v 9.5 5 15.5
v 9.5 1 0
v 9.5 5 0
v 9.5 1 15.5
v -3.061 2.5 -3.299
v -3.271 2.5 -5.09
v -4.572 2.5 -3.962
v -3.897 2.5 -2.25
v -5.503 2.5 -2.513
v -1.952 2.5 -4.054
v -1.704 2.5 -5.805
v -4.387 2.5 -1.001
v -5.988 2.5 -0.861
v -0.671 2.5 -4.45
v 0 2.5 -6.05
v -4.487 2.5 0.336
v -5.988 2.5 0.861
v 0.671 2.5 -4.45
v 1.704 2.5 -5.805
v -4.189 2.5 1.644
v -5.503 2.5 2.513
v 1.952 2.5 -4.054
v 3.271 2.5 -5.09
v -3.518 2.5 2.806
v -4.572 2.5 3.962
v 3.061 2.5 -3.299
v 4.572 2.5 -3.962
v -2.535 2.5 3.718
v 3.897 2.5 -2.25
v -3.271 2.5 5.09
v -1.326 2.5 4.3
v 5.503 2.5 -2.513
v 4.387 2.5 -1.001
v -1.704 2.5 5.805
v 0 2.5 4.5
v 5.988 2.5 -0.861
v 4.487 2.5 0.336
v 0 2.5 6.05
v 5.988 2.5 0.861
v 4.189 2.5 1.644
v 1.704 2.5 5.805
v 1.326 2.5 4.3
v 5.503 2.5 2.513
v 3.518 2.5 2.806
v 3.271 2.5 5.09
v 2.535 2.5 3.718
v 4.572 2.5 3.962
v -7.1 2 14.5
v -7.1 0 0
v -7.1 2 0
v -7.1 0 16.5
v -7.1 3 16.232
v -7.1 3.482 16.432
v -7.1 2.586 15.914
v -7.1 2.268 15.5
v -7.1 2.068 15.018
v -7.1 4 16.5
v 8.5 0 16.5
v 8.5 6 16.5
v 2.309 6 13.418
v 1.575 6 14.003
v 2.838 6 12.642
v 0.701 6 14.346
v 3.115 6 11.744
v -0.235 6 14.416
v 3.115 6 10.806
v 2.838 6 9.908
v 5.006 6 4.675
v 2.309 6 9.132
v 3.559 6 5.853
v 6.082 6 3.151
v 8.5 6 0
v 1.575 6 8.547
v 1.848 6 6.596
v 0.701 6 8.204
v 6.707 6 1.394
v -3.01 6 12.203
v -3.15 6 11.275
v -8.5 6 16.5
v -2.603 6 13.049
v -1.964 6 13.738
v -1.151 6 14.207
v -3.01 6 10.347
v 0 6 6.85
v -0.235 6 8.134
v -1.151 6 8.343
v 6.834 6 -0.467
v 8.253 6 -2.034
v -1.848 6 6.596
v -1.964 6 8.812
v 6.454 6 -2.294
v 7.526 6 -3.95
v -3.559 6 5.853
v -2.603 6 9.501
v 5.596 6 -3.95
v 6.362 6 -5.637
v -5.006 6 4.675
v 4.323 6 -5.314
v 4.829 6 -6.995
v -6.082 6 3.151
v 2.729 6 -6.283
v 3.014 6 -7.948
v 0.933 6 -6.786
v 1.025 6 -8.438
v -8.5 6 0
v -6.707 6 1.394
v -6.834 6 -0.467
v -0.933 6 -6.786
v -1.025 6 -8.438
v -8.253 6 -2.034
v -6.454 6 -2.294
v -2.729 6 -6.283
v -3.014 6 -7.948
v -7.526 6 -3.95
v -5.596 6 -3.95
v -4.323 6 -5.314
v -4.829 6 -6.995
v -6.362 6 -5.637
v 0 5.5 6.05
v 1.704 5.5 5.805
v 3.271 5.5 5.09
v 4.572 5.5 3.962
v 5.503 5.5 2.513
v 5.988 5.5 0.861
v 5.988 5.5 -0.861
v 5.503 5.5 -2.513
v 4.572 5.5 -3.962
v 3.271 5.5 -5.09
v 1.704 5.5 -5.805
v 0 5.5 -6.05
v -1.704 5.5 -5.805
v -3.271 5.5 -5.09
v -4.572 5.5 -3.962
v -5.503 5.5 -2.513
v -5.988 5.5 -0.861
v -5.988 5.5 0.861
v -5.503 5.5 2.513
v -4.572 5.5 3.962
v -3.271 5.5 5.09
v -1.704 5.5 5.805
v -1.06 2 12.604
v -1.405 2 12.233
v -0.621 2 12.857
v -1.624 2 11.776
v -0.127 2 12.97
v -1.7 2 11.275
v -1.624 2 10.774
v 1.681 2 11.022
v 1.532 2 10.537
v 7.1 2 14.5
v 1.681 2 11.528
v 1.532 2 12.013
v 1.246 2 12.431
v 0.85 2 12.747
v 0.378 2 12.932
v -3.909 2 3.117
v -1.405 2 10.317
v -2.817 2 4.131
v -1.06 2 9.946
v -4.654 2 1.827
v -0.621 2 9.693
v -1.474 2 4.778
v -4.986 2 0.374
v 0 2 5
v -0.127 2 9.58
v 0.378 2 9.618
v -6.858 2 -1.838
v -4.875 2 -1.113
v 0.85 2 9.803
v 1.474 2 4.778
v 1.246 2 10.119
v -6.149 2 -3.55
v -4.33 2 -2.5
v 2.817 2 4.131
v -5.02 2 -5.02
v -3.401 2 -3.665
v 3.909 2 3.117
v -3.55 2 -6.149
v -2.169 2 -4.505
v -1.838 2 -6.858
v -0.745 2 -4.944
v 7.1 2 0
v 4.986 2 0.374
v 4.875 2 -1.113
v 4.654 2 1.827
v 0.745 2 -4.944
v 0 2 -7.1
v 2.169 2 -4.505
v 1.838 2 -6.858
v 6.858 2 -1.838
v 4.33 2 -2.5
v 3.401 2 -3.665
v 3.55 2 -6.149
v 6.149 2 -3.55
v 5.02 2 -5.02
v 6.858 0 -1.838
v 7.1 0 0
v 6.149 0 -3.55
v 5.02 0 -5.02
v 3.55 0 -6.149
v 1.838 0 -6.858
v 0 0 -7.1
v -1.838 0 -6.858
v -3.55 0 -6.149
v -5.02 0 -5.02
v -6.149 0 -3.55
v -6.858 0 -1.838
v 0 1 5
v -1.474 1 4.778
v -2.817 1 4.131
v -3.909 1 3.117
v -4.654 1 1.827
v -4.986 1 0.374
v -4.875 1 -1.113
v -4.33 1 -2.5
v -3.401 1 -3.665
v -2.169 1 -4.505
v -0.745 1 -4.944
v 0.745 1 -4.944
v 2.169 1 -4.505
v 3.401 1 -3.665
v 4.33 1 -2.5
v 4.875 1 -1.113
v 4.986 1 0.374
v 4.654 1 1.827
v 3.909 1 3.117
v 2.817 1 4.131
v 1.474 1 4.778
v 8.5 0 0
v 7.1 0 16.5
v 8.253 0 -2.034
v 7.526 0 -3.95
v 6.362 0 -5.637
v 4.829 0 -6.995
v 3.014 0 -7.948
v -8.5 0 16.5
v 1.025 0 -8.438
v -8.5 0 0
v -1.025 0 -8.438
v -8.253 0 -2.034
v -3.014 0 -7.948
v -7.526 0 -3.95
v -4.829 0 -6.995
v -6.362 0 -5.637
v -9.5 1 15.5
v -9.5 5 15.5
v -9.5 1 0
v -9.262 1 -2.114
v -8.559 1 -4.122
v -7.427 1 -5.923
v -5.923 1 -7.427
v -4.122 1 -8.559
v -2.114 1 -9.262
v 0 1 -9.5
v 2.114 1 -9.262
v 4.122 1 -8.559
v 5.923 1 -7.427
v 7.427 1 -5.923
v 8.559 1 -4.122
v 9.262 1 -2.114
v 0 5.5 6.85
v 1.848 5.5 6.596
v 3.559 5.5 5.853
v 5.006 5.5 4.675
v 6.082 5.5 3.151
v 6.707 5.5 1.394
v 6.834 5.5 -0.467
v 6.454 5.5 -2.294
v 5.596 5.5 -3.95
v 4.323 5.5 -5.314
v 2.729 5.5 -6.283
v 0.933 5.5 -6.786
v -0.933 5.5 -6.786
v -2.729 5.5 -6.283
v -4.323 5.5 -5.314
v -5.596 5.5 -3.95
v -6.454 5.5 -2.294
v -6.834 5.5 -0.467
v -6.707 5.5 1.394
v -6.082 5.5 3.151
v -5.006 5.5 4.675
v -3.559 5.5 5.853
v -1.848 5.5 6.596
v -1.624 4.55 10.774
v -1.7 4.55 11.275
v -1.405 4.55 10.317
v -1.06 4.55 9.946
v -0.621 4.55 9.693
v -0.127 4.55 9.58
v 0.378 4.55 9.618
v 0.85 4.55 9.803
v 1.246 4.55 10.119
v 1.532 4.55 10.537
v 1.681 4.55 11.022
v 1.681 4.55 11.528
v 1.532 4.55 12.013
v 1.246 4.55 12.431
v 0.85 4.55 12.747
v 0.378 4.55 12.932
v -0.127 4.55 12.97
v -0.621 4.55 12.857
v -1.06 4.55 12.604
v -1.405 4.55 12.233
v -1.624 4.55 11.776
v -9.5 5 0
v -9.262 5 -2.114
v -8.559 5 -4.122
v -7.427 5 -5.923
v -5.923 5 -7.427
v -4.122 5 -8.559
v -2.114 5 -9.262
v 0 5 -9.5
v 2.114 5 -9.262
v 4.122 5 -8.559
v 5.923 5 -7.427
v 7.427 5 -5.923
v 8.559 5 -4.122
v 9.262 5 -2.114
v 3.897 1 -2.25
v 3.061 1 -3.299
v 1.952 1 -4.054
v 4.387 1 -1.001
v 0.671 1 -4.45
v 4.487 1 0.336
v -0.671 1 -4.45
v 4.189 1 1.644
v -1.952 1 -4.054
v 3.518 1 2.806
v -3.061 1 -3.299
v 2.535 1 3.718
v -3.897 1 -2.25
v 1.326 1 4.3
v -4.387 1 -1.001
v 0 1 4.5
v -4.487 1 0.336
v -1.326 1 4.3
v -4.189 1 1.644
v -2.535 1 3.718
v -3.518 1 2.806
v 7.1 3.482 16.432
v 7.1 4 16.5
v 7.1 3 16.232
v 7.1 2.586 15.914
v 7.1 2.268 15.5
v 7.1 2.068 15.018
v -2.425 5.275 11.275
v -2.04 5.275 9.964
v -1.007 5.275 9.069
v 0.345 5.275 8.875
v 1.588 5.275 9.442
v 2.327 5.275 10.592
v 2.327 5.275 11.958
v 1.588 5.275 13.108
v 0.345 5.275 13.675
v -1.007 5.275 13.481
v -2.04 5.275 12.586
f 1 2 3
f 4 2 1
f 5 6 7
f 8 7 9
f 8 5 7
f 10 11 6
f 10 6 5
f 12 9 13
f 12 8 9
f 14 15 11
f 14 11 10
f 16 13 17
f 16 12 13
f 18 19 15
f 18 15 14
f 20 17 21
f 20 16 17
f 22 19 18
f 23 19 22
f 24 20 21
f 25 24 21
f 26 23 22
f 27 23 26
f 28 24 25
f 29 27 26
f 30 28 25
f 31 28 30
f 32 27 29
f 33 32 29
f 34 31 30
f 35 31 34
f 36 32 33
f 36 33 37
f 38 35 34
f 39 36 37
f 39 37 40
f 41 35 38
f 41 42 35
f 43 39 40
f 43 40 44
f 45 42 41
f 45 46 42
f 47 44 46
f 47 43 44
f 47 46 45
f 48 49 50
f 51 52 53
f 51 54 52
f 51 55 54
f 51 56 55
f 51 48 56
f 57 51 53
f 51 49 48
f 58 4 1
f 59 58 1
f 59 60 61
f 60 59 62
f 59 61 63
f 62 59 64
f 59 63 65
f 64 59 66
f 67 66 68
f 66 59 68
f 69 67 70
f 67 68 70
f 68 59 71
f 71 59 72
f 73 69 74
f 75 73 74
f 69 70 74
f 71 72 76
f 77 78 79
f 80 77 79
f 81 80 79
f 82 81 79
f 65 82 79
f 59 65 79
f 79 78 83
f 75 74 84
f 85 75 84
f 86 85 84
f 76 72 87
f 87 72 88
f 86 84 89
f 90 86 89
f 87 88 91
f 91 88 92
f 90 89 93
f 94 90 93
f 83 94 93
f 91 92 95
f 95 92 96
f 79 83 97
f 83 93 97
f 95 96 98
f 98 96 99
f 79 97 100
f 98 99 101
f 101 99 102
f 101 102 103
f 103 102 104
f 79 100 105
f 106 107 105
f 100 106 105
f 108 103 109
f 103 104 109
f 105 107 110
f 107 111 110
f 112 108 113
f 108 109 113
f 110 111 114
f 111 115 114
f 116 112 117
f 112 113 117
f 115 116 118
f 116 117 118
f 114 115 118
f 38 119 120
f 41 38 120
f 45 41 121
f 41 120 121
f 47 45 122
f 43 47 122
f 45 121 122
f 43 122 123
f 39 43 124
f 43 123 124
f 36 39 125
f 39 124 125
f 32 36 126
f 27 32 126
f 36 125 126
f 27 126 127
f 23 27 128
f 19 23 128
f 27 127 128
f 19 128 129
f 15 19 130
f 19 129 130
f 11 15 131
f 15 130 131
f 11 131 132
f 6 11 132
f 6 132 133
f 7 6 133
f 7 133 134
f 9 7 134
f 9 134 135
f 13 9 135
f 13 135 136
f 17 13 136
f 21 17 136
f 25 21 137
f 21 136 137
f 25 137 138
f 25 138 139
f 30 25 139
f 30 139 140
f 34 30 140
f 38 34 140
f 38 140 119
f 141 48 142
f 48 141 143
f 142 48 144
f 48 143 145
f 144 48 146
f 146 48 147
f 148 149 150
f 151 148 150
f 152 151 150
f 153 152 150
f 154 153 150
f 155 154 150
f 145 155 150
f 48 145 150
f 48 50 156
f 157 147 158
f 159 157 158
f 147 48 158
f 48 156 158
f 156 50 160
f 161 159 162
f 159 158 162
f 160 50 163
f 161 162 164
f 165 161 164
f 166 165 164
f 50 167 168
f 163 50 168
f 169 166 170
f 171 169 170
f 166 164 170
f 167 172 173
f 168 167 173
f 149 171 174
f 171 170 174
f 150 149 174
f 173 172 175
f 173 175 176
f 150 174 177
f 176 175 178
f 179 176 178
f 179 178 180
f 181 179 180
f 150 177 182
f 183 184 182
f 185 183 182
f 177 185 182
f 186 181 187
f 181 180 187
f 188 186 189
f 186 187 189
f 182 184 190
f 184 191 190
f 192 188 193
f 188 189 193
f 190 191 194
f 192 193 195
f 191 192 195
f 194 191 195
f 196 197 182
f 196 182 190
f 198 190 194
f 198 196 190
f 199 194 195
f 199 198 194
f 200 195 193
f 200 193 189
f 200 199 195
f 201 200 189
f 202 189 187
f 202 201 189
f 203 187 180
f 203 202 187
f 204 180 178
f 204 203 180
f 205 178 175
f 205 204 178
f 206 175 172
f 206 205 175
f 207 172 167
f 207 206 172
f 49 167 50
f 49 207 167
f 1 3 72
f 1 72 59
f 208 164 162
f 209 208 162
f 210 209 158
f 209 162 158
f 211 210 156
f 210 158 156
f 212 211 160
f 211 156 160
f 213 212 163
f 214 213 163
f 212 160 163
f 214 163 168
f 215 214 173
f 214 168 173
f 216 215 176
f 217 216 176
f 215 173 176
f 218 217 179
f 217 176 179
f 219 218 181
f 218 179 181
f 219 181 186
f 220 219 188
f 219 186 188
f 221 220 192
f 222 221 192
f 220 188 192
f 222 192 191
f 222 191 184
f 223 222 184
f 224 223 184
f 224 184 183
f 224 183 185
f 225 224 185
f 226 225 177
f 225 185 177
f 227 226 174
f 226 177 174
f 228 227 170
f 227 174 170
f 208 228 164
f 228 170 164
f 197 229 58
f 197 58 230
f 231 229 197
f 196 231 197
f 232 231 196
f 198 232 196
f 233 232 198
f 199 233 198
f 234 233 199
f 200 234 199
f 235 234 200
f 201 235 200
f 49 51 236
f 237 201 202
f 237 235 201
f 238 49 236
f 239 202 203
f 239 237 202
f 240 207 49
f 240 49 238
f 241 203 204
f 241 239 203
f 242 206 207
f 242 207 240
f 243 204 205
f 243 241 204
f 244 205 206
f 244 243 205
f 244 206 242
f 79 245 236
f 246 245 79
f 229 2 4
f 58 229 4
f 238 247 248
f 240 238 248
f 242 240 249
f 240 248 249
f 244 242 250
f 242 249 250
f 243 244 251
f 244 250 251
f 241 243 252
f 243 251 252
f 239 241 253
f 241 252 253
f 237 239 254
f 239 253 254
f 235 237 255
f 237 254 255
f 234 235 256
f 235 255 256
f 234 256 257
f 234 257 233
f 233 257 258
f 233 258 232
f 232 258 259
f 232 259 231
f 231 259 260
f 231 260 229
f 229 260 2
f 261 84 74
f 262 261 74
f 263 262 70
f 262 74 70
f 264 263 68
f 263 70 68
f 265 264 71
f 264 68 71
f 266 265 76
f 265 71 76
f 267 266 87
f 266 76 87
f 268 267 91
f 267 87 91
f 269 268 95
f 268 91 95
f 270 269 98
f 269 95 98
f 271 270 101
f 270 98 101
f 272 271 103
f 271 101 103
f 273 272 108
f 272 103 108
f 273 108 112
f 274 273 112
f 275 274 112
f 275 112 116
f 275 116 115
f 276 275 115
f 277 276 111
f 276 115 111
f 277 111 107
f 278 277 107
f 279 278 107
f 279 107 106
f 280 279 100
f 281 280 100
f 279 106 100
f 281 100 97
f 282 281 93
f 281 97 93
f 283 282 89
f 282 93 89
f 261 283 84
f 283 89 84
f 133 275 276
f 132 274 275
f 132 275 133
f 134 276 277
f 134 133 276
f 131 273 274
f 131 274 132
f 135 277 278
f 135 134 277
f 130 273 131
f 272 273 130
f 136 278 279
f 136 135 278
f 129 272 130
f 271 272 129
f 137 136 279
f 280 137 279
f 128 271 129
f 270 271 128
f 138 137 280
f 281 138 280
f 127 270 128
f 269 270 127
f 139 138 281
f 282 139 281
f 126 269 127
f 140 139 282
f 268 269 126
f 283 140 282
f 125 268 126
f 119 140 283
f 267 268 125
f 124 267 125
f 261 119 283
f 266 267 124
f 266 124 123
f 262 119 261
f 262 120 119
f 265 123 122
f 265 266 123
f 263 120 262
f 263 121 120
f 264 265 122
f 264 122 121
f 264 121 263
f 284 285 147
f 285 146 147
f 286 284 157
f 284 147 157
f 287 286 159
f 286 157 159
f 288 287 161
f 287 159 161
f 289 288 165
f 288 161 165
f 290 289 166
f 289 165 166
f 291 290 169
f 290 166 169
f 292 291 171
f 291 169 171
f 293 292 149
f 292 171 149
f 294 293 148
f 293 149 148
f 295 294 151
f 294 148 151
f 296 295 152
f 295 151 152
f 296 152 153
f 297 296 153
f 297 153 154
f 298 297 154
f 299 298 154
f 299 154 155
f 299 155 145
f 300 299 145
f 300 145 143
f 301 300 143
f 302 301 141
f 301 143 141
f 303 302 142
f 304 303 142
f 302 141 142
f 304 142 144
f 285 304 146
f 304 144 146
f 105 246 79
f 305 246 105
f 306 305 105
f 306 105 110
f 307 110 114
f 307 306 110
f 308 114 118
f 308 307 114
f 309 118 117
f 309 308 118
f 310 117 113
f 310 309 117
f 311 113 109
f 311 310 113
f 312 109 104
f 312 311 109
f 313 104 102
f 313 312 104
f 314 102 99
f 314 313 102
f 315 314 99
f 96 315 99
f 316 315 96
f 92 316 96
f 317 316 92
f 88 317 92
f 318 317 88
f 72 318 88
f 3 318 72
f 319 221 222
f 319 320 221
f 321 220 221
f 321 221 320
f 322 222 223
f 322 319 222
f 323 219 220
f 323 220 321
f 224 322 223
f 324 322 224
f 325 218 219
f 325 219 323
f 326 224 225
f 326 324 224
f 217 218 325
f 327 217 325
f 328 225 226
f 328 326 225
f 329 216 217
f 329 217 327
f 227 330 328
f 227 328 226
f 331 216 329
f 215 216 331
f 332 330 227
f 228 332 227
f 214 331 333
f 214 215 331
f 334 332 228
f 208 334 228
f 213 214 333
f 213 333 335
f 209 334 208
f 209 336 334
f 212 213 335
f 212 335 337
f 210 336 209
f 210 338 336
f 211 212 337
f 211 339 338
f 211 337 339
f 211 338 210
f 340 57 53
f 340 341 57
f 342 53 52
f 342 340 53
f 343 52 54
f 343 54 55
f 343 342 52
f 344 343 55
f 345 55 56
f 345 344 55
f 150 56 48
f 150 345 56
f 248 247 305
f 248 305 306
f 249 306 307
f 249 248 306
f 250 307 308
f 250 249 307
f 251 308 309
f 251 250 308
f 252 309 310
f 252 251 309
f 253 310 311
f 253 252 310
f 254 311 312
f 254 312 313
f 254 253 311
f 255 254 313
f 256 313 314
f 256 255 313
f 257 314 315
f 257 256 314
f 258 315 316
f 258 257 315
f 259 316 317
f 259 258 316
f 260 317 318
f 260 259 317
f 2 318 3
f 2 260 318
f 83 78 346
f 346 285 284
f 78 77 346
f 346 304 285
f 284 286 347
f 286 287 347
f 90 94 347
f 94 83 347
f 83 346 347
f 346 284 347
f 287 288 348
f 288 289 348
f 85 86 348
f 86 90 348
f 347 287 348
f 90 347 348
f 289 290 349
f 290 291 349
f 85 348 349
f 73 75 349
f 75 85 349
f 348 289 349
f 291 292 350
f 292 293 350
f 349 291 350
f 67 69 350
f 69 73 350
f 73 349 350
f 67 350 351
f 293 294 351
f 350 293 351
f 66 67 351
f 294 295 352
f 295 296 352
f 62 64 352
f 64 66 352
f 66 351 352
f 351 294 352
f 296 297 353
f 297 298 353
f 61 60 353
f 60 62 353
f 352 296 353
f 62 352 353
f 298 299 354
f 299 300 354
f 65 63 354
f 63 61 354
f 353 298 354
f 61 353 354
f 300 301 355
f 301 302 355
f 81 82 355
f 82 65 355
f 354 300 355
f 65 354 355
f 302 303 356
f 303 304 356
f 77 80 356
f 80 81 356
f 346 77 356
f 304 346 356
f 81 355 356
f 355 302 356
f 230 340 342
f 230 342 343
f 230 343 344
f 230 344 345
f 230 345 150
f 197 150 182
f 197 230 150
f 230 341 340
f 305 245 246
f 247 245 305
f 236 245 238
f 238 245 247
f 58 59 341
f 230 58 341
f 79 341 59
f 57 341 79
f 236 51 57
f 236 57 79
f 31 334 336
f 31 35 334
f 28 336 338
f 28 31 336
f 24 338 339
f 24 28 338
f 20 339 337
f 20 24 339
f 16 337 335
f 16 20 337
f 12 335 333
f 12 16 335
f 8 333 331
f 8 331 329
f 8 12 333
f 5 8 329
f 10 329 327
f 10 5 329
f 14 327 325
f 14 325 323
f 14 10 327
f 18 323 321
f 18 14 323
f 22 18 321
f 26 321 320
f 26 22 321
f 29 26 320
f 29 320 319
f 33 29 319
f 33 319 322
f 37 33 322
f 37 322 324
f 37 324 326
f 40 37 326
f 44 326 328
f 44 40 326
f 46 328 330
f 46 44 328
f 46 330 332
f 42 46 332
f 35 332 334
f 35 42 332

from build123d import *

# Parameters (mm, degrees)
BOSS_EXTRUDE1_DEPTH                                 = 6
CUT_EXTRUDE1_DEPTH                                  = 2
SKETCH3_R                                           = 6.05
CUT_EXTRUDE2_DEPTH                                  = 3.5
SKETCH4_R                                           = 6.85
CUT_EXTRUDE3_DEPTH                                  = 0.5
CUT_EXTRUDE4_REACH                                  = 21.358
SKETCH5_R                                           = 4.5
FILLET1_R                                           = 2
SKETCH6_R                                           = 5
SKETCH6_R_2                                         = 4.5
BOSS_EXTRUDE2_DEPTH                                 = 1
CSK_FOR_M3_COUNTERSUNK_FLAT_HEAD_SCREW1_D           = 3.4
CSK_FOR_M3_COUNTERSUNK_FLAT_HEAD_SCREW1_CSINK_D     = 6.3
CSK_FOR_M3_COUNTERSUNK_FLAT_HEAD_SCREW1_CSINK_ANGLE = 90
CHAMFER1_SIZE                                       = 1


with BuildPart() as part:
    # Sketch2 → Boss-Extrude1 (new body)
    with BuildSketch(Plane(origin=(0, 0, 0), x_dir=(1, 0, 0), z_dir=(0, 1, 0))):
        with BuildLine():
            Line((-9.5, -16.5), (-9.5, 0))
            ThreePointArc((-9.5, 0), (0, 9.5), (9.5, 0))
            Line((9.5, 0), (9.5, -16.5))
            Line((9.5, -16.5), (-9.5, -16.5))
        make_face()
    extrude(amount=BOSS_EXTRUDE1_DEPTH)

    # Sketch1 → Cut-Extrude1 (cut)
    with BuildSketch(Plane(origin=(0, 0, 0), x_dir=(1, 0, 0), z_dir=(0, 1, 0))):
        with BuildLine():
            Line((-7.1, 0), (-7.1, -16.5))
            Line((-7.1, -16.5), (7.1, -16.5))
            Line((7.1, -16.5), (7.1, 0))
            ThreePointArc((7.1, 0), (0, 7.1), (-7.1, 0))
        make_face()
    extrude(amount=CUT_EXTRUDE1_DEPTH, mode=Mode.SUBTRACT)

    # Sketch3 → Cut-Extrude2 (cut)
    with BuildSketch(Plane(origin=(0, 6, 0), x_dir=(1, 0, 0), z_dir=(0, 1, 0))):
        with Locations(Location((0, 0, 0), (0, 0, 270))):
            Circle(SKETCH3_R)
    extrude(amount=-CUT_EXTRUDE2_DEPTH, mode=Mode.SUBTRACT)

    # Sketch4 → Cut-Extrude3 (cut)
    with BuildSketch(Plane(origin=(0, 6, 0), x_dir=(1, 0, 0), z_dir=(0, 1, 0))):
        with Locations(Location((0, 0, 0), (0, 0, 270))):
            Circle(SKETCH4_R)
    extrude(amount=-CUT_EXTRUDE3_DEPTH, mode=Mode.SUBTRACT)

    # Sketch5 → Cut-Extrude4 (cut, up to next)
    with BuildSketch(Plane(origin=(0, 2.5, 0), x_dir=(1, 0, 0), z_dir=(0, 1, 0)), mode=Mode.PRIVATE) as cut_extrude4_sk1:
        with Locations(Location((0, 0, 0), (0, 0, 270))):
            Circle(SKETCH5_R)
    cut_extrude4_tool1 = extrude(cut_extrude4_sk1.sketch, amount=-CUT_EXTRUDE4_REACH, mode=Mode.PRIVATE) & part.part
    add(cut_extrude4_tool1.solids().sort_by_distance((0, 2.5, 0))[0], mode=Mode.SUBTRACT)

    # Fillet1
    fillet1_edges = [part.edges().sort_by_distance(p)[0] for p in [
        (0, 2, 16.5),
    ]]
    fillet(fillet1_edges, radius=FILLET1_R)

    # Sketch6 → Boss-Extrude2 (add)
    with BuildSketch(Plane.XZ.offset(-2)):
        with Locations(Location((0, 0, 0), (0, 0, 90))):
            Circle(SKETCH6_R)
        with Locations(Location((0, 0, 0), (0, 0, 90))):
            Circle(SKETCH6_R_2, mode=Mode.SUBTRACT)
    extrude(amount=BOSS_EXTRUDE2_DEPTH)

    # CSK for M3 Countersunk Flat Head Screw1 (through all)
    with Locations(Plane(origin=(0, 6, 0), x_dir=(1, 0, 0), z_dir=(0, 1, 0))):
        with Locations((0, -11.275)):
            CounterSinkHole(CSK_FOR_M3_COUNTERSUNK_FLAT_HEAD_SCREW1_D / 2, CSK_FOR_M3_COUNTERSUNK_FLAT_HEAD_SCREW1_CSINK_D / 2, counter_sink_angle=CSK_FOR_M3_COUNTERSUNK_FLAT_HEAD_SCREW1_CSINK_ANGLE)

    # Chamfer1
    chamfer1_edges = [part.edges().sort_by_distance(p)[0] for p in [
        (9.5, 6, 8.25),
        (0, 6, -9.5),
        (9.5, 0, 8.25),
        (-9.5, 0, 8.25),
        (0, 0, -9.5),
        (-9.5, 6, 8.25),
        (9.5, 3, 16.5),
        (-9.5, 3, 16.5),
    ]]
    chamfer(chamfer1_edges, length=CHAMFER1_SIZE)


solid = part.part
